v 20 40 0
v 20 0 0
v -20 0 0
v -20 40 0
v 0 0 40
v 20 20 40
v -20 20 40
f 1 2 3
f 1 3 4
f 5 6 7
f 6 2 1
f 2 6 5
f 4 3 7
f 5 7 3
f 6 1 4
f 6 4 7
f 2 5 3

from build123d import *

# Parameters (mm, degrees)
F1_DEPTH = 20
F5_DEPTH = 13.3343333333


# Not quite as in the source:
# - a pattern or mirror of a feature is missing from the dataset's text; its kind, count and spacing are read off the source's solid


with BuildPart() as f1:
    # F0 (on Right) → F1 (new body, symmetric)
    with BuildSketch(Plane.YZ):
        Polygon((0, 40), (0, 0), (40, 0), (20, 40), align=None)
    extrude(amount=F1_DEPTH, both=True)

    # F4 (on 3pt) → F5 (cut, through all)
    with BuildSketch(Plane(origin=(8.8888888889, -8.8888888889, 4.4444444444), x_dir=(-0.7453559925, -0.596284794, 0.298142397), z_dir=(-0.6666666667, 0.6666666667, -0.3333333333))):
        Polygon((-14.90711985, 0), (11.92569588, 35.77708764), (-14.90711985, 44.72135955), align=None)
    f5 = extrude(amount=-F5_DEPTH, mode=Mode.SUBTRACT)

    # F5_copies: F5 across plane
    add(f5.mirror(Plane(origin=(0, 0, 0), x_dir=(0, 0, -1), z_dir=(-1, 0, 0))), mode=Mode.SUBTRACT)


solid = f1.part
